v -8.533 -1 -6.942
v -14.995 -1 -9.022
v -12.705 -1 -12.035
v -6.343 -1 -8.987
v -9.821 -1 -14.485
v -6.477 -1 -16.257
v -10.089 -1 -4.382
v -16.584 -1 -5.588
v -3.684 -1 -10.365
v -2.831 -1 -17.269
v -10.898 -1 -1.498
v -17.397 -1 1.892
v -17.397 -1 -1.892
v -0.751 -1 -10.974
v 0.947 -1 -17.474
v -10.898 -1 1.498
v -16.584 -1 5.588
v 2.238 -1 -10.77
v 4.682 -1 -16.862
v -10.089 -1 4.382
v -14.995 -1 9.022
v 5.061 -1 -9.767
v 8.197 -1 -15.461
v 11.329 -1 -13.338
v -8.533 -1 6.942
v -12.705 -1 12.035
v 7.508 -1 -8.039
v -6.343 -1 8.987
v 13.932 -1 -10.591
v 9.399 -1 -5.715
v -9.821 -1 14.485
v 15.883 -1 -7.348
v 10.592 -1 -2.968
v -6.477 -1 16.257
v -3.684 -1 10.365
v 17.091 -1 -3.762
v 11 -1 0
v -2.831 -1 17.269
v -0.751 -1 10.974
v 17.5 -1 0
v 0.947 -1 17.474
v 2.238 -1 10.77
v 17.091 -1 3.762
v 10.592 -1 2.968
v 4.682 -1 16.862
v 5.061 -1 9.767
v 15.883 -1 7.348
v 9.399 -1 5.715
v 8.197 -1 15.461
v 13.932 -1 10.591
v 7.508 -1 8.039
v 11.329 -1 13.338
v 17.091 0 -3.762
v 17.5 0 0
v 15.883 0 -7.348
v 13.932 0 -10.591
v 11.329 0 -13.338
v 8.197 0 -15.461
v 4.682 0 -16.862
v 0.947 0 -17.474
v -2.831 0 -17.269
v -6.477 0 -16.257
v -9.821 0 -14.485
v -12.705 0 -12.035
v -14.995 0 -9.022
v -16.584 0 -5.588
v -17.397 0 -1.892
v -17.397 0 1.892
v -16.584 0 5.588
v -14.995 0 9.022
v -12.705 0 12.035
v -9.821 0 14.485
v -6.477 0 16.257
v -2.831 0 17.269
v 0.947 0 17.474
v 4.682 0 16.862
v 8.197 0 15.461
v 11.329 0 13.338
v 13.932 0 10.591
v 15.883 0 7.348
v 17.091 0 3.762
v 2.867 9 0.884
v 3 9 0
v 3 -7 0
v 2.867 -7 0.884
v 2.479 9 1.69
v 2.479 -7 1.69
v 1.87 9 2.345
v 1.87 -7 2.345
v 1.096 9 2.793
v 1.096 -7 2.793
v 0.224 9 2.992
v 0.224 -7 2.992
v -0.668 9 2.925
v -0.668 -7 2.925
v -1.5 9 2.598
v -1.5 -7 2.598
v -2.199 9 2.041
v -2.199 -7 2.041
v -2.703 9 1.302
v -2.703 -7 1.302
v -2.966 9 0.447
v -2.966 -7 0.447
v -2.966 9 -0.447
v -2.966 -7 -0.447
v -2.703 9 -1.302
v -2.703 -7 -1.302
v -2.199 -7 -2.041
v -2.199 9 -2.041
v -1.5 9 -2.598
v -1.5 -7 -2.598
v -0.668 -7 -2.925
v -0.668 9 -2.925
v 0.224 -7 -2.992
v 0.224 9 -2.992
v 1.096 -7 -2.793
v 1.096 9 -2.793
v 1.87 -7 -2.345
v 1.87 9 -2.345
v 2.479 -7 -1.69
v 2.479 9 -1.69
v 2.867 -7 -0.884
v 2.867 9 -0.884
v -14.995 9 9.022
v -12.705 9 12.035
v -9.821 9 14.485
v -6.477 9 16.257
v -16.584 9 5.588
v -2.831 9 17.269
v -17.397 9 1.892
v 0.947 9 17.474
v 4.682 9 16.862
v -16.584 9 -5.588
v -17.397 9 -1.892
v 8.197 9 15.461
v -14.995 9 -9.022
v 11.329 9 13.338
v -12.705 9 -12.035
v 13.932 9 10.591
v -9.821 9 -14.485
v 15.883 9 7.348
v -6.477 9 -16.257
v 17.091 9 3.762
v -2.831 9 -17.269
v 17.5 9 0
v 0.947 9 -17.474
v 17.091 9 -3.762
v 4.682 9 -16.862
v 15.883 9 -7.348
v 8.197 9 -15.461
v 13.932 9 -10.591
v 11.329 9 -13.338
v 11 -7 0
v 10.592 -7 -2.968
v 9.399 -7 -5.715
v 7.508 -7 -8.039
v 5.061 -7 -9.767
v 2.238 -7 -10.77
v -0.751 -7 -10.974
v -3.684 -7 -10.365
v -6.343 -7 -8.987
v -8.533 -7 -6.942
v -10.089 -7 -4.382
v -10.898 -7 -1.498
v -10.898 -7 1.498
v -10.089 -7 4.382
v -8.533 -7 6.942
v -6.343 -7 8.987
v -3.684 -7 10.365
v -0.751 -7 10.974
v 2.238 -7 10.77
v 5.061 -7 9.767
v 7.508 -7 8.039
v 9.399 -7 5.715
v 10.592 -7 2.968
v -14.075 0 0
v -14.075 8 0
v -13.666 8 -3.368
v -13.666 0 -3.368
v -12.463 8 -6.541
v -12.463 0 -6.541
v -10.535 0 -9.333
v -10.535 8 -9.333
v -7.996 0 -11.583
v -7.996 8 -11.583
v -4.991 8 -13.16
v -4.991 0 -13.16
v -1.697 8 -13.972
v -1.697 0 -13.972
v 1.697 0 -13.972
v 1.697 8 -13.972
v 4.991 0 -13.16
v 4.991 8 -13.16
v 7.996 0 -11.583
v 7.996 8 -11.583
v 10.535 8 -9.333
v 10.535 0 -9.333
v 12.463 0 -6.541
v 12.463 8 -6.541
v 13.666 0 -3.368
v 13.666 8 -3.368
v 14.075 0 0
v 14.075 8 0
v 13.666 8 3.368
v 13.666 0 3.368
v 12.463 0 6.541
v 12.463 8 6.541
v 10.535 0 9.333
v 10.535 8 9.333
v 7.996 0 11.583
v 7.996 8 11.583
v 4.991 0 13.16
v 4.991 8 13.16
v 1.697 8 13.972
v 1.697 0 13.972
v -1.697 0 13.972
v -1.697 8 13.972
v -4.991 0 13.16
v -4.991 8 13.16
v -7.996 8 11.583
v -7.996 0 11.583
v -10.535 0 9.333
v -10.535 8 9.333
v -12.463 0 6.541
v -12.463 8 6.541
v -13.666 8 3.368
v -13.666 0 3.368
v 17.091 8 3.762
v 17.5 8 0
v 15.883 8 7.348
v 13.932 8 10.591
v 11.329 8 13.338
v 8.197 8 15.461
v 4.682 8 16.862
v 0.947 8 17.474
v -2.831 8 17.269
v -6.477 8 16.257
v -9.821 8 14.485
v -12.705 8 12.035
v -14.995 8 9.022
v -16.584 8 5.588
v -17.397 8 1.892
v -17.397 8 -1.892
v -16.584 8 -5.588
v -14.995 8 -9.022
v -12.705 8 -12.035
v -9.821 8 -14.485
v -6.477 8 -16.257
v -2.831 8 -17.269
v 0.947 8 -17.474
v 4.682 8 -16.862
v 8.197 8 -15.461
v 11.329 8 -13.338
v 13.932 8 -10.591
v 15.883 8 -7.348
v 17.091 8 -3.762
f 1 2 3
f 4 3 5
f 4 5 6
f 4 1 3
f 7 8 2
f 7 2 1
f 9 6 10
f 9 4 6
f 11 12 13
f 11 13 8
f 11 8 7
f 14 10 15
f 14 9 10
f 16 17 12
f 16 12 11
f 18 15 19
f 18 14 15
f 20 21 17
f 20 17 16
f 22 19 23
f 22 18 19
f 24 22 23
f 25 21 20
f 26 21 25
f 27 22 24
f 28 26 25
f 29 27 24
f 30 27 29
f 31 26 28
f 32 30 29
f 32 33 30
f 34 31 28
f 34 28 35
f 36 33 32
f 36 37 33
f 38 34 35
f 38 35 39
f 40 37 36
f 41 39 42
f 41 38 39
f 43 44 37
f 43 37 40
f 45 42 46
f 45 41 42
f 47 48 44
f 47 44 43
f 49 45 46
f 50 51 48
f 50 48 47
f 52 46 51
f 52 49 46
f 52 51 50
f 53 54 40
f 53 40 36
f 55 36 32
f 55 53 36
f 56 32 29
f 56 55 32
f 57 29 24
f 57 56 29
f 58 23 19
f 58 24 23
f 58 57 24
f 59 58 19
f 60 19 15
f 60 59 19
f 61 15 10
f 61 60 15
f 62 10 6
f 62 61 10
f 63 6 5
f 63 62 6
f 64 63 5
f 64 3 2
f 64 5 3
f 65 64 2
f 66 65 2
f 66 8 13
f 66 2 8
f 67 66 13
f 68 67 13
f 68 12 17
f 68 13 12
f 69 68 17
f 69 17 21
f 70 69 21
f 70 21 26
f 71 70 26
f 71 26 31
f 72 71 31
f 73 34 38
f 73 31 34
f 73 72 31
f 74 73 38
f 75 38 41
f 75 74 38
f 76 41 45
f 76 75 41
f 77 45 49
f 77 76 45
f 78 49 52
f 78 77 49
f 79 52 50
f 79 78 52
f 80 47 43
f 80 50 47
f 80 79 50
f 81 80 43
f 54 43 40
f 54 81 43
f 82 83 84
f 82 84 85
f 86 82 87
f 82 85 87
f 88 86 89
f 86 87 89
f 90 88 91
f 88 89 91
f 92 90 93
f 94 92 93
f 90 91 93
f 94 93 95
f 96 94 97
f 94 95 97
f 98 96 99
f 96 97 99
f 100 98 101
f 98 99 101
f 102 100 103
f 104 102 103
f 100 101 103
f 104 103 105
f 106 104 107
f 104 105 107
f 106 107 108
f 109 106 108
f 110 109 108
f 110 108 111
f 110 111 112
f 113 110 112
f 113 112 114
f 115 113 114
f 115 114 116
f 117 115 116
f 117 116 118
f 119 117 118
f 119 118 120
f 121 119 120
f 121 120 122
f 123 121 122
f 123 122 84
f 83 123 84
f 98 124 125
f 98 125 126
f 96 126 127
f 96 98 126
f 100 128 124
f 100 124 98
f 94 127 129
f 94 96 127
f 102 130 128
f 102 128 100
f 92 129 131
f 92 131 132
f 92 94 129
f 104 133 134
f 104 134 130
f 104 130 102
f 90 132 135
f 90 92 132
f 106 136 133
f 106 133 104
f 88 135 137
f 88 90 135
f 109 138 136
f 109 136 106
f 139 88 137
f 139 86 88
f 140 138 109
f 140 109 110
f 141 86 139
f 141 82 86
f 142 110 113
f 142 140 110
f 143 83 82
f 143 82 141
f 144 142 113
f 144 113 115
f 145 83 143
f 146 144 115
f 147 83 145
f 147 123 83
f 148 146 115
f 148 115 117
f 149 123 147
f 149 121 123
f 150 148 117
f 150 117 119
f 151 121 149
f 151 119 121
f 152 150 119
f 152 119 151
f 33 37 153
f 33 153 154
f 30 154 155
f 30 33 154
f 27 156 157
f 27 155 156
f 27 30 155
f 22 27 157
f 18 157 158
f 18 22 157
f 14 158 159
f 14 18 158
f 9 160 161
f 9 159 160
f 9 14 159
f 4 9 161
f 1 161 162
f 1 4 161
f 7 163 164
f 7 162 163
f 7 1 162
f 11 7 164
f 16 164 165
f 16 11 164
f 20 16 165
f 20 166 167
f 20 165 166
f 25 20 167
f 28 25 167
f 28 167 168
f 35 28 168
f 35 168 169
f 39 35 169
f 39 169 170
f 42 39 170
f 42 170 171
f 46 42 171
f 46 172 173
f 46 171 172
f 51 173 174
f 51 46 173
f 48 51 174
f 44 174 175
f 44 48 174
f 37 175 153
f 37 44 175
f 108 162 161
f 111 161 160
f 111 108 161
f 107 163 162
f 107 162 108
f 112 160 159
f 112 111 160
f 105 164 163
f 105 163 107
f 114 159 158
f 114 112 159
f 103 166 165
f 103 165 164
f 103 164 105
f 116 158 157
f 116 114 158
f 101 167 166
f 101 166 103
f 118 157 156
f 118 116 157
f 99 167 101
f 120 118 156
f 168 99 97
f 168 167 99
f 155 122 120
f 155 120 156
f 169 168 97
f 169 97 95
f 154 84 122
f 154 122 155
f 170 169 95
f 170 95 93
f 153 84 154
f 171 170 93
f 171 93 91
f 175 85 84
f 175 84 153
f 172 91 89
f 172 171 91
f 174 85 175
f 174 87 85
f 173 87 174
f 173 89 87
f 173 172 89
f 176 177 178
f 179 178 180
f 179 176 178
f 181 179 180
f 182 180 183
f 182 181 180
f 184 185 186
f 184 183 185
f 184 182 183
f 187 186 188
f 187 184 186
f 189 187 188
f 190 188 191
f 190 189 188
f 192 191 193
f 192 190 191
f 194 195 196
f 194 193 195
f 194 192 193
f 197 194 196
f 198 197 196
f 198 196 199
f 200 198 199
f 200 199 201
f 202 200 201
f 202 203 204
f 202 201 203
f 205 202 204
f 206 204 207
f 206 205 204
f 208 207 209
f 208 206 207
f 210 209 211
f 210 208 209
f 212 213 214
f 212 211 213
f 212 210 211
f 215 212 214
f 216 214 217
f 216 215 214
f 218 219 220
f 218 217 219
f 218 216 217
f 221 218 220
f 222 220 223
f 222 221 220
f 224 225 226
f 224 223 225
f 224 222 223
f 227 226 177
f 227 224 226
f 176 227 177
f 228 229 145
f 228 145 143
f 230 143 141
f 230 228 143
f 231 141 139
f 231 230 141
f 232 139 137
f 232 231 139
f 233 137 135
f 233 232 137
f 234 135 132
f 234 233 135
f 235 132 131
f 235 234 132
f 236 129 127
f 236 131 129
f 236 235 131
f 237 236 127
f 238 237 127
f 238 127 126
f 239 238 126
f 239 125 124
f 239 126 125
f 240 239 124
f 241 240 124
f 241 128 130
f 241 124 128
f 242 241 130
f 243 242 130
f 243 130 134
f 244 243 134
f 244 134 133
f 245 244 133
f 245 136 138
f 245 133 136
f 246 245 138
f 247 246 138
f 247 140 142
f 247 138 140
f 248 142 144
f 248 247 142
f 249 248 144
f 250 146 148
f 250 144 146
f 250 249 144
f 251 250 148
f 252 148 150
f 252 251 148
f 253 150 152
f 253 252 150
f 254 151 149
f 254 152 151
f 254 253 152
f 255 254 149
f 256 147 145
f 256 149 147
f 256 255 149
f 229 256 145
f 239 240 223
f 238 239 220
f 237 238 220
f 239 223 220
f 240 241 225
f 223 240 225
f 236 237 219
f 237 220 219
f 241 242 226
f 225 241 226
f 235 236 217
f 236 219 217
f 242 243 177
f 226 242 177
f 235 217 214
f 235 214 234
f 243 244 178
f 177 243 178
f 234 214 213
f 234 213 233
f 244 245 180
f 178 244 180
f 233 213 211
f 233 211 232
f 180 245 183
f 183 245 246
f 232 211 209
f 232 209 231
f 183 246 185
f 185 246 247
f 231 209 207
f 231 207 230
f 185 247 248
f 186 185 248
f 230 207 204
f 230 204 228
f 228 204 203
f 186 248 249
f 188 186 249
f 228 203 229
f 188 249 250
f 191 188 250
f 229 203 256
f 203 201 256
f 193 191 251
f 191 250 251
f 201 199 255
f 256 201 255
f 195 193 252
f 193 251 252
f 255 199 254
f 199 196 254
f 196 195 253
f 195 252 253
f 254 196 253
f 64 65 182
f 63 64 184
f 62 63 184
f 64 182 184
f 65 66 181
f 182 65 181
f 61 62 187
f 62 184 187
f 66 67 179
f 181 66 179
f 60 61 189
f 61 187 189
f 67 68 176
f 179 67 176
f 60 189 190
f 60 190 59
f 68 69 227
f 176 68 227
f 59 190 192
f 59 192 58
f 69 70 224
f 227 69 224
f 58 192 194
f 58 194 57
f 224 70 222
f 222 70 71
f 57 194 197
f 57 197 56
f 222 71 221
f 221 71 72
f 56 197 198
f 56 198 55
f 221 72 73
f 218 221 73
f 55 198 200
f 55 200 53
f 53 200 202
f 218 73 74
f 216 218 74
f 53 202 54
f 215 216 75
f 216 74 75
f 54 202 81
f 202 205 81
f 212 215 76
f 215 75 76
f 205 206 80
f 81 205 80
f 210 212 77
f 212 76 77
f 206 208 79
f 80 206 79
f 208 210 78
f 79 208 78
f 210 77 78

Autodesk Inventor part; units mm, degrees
ref_plane "YZ Plane" through (0, 0, 0) normal (1, 0, 0) x (0, 1, 0)
ref_plane "XZ Plane" through (0, 0, 0) normal (0, 1, 0) x (-1, 0, 0)
ref_plane "XY Plane" through (0, 0, 0) normal (0, 0, 1) x (1, 0, 0)
sketch "Esquisse1" plane through (0, 0, 0) normal (0, 1, 0) x (-1, 0, 0)
  circle A0 centre (0, 0) radius 14.075
  dimension "d0" = 28.15
extrude "Extrusion1" add sketch "Esquisse1" along normal blind 8
sketch "Esquisse2" plane through (0, 8, 0) normal (0, 1, 0) x (1, 0, 0)
  circle A0 centre (0, 0) radius 14.075 projected
  circle A1 centre (0, 0) radius 17.5
  dimension "d3" = 35
extrude "Extrusion2" add sketch "Esquisse2" along normal blind 1 contours A0 | A1
sketch "Esquisse3" plane through (0, 0, 0) normal (0, -1, 0) x (1, 0, 0)
  circle A0 centre (0, 0) radius 14.075 projected
  circle A1 centre (0, 0) radius 17.5
  dimension "d6" = 35
extrude "Extrusion3" add sketch "Esquisse3" along normal blind 1 contours A0 | A1
sketch "Esquisse4" plane through (0, -1, 0) normal (0, -1, 0) x (1, 0, 0)
  circle A0 centre (0, 0) radius 17.5 projected
  circle A1 centre (0, 0) radius 11
  dimension "d9" = 22
extrude "Extrusion4" add sketch "Esquisse4" along normal blind 6 contours A1
sketch "Esquisse5" plane through (0, -7, 0) normal (0, -1, 0) x (1, 0, 0)
  circle A0 centre (0, 0) radius 11 projected
  circle A1 centre (0, 0) radius 3
  dimension "d12" = 6
extrude "Extrusion5" cut sketch "Esquisse5" against normal through all contours A1
properties part number "poulie_rs_16T2p5s40-2"
